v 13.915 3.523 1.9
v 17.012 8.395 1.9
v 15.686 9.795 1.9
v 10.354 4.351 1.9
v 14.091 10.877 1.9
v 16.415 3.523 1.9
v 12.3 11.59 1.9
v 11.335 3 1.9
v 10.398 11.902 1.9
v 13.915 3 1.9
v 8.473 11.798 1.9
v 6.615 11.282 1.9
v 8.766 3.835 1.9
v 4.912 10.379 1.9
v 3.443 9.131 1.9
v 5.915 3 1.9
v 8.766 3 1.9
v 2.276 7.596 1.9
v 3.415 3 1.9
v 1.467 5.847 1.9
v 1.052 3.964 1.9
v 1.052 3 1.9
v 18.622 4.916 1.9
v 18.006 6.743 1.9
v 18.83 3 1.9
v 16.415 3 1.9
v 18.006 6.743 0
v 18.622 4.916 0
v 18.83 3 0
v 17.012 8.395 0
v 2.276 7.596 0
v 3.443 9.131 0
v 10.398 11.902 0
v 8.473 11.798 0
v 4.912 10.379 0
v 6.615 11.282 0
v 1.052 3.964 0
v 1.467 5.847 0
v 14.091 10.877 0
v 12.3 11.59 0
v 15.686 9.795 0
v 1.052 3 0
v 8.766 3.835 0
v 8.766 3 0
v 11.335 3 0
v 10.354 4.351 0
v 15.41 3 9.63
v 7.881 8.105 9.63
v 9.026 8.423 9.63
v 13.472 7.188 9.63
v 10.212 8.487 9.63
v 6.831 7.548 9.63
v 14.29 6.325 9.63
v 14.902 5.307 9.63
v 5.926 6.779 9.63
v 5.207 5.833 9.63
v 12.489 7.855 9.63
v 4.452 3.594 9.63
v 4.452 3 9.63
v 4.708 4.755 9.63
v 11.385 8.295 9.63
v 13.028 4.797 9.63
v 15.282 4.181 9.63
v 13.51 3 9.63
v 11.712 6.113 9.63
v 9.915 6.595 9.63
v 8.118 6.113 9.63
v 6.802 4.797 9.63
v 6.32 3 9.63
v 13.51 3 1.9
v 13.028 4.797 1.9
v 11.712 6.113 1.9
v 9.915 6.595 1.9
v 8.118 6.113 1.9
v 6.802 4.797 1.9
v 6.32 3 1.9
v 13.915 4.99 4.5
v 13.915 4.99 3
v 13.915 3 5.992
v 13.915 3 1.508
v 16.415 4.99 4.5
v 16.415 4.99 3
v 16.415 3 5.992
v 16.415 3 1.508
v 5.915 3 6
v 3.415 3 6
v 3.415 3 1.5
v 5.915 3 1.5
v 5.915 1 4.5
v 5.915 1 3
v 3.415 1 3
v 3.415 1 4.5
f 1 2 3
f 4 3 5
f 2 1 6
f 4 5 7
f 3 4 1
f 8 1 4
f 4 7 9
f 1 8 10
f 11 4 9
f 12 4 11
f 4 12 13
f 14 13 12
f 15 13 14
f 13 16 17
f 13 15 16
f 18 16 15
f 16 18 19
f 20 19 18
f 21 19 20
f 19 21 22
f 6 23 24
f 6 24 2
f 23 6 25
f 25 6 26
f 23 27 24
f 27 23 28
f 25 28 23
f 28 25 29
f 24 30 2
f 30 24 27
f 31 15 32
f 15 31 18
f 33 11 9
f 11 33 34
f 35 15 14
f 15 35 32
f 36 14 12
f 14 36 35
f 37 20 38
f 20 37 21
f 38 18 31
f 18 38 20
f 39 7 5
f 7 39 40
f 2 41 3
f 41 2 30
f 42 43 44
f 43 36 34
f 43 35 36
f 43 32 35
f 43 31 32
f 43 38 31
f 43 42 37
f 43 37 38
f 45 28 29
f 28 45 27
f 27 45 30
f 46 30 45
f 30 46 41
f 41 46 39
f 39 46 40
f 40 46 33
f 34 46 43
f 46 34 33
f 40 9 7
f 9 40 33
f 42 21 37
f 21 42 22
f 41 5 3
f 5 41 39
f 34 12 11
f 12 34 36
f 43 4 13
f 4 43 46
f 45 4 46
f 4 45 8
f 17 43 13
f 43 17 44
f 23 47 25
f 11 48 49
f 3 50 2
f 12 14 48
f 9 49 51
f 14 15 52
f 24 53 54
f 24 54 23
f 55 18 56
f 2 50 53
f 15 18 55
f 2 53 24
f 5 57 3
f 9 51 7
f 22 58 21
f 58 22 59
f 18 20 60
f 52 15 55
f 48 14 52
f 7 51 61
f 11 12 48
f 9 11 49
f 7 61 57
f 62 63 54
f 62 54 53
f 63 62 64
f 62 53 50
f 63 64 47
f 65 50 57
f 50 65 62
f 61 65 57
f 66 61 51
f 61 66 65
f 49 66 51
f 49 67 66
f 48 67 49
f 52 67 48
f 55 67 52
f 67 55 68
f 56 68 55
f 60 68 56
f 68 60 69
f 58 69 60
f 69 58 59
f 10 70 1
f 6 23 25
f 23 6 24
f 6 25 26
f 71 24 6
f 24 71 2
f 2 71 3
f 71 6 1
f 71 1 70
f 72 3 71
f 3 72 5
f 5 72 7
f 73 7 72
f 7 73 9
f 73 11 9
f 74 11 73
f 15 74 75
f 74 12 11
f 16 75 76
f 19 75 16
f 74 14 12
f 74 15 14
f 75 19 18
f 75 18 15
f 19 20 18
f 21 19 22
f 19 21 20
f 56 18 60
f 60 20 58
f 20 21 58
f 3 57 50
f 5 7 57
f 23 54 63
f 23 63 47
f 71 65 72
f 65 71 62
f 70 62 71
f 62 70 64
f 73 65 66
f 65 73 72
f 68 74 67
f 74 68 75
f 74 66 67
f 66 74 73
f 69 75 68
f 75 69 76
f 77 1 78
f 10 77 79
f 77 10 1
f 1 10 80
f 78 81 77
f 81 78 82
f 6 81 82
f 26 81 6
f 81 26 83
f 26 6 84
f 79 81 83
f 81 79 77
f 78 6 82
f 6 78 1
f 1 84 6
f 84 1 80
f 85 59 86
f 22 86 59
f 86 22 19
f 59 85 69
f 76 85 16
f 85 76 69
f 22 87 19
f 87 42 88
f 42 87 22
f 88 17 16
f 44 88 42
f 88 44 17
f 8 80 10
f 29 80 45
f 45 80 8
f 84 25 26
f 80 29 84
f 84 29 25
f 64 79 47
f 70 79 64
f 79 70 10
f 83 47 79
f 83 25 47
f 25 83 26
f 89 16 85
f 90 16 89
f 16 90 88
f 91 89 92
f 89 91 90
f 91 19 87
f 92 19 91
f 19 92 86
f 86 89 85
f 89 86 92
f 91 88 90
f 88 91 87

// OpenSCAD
	// First half
	translate([9.915, 3, 0])
	union() {
		difference() {
			union() {
				difference() {
					cylinder(h = 1.9, r = 8.915);
					cylinder(h = 1.9, r = 1.42);
				}
				translate([0,0,1.9])
				difference() {
					cylinder(h = 7.73, r1 = 8.915, r2 = 5.495);
					cylinder(h = 7.73, r = 3.595);
				}
			}
			translate([0,-4.815,4.815])
			cube (size = [17.83,9.63,9.7], center = true);

			// groove
			translate([5.25,1.99,0])
			rotate([0,0,270]) {
				difference() {
					translate([0,-1.25,1.5])
					cube (size = [2,2.5,4.5], center = false);
					translate([0,0,-15.5])
					union() {
						polyhedron ( points = [[0, -1.25, 21.5], [0, 1.25, 21.5], [0, 1.25, 20], 
									[0, -1.25, 20], [2, -1.25, 21.5], [2, 1.25, 21.5]], 
						  triangles = [[0,3,2], [0,2,1],  [3,0,4], [1,2,5], 
									   [0,5,4], [0,1,5],  [5,2,4], [4,2,3], ]);
						polyhedron ( points = [[0, -1.25, 18.5], [0, 1.25, 18.5], [0, 1.25, 17], 
									[0, -1.25, 17], [2, -1.25, 17], [2, 1.25, 17]], 
						  triangles = [[0,3,2], [0,2,1],  [3,0,4], [1,2,5], 
									   [0,5,4], [0,1,5],  [5,2,4], [4,2,3], ]);
					}
				}
			}

		}
		translate([-5.25,-2,0])
		rotate([0,0,90]) {
			difference() {
				translate([0,-1.25,1.5])
				cube (size = [2,2.5,4.5], center = false);
				translate([0,0,-15.5])
				union() {
					polyhedron ( points = [[0, -1.25, 21.5], [0, 1.25, 21.5], [0, 1.25, 20], 
								[0, -1.25, 20], [2, -1.25, 21.5], [2, 1.25, 21.5]], 
					  triangles = [[0,3,2], [0,2,1],  [3,0,4], [1,2,5], 
								   [0,5,4], [0,1,5],  [5,2,4], [4,2,3], ]);
					polyhedron ( points = [[0, -1.25, 18.5], [0, 1.25, 18.5], [0, 1.25, 17], 
								[0, -1.25, 17], [2, -1.25, 17], [2, 1.25, 17]], 
					  triangles = [[0,3,2], [0,2,1],  [3,0,4], [1,2,5], 
								   [0,5,4], [0,1,5],  [5,2,4], [4,2,3], ]);
				}
			}
		}
	}
